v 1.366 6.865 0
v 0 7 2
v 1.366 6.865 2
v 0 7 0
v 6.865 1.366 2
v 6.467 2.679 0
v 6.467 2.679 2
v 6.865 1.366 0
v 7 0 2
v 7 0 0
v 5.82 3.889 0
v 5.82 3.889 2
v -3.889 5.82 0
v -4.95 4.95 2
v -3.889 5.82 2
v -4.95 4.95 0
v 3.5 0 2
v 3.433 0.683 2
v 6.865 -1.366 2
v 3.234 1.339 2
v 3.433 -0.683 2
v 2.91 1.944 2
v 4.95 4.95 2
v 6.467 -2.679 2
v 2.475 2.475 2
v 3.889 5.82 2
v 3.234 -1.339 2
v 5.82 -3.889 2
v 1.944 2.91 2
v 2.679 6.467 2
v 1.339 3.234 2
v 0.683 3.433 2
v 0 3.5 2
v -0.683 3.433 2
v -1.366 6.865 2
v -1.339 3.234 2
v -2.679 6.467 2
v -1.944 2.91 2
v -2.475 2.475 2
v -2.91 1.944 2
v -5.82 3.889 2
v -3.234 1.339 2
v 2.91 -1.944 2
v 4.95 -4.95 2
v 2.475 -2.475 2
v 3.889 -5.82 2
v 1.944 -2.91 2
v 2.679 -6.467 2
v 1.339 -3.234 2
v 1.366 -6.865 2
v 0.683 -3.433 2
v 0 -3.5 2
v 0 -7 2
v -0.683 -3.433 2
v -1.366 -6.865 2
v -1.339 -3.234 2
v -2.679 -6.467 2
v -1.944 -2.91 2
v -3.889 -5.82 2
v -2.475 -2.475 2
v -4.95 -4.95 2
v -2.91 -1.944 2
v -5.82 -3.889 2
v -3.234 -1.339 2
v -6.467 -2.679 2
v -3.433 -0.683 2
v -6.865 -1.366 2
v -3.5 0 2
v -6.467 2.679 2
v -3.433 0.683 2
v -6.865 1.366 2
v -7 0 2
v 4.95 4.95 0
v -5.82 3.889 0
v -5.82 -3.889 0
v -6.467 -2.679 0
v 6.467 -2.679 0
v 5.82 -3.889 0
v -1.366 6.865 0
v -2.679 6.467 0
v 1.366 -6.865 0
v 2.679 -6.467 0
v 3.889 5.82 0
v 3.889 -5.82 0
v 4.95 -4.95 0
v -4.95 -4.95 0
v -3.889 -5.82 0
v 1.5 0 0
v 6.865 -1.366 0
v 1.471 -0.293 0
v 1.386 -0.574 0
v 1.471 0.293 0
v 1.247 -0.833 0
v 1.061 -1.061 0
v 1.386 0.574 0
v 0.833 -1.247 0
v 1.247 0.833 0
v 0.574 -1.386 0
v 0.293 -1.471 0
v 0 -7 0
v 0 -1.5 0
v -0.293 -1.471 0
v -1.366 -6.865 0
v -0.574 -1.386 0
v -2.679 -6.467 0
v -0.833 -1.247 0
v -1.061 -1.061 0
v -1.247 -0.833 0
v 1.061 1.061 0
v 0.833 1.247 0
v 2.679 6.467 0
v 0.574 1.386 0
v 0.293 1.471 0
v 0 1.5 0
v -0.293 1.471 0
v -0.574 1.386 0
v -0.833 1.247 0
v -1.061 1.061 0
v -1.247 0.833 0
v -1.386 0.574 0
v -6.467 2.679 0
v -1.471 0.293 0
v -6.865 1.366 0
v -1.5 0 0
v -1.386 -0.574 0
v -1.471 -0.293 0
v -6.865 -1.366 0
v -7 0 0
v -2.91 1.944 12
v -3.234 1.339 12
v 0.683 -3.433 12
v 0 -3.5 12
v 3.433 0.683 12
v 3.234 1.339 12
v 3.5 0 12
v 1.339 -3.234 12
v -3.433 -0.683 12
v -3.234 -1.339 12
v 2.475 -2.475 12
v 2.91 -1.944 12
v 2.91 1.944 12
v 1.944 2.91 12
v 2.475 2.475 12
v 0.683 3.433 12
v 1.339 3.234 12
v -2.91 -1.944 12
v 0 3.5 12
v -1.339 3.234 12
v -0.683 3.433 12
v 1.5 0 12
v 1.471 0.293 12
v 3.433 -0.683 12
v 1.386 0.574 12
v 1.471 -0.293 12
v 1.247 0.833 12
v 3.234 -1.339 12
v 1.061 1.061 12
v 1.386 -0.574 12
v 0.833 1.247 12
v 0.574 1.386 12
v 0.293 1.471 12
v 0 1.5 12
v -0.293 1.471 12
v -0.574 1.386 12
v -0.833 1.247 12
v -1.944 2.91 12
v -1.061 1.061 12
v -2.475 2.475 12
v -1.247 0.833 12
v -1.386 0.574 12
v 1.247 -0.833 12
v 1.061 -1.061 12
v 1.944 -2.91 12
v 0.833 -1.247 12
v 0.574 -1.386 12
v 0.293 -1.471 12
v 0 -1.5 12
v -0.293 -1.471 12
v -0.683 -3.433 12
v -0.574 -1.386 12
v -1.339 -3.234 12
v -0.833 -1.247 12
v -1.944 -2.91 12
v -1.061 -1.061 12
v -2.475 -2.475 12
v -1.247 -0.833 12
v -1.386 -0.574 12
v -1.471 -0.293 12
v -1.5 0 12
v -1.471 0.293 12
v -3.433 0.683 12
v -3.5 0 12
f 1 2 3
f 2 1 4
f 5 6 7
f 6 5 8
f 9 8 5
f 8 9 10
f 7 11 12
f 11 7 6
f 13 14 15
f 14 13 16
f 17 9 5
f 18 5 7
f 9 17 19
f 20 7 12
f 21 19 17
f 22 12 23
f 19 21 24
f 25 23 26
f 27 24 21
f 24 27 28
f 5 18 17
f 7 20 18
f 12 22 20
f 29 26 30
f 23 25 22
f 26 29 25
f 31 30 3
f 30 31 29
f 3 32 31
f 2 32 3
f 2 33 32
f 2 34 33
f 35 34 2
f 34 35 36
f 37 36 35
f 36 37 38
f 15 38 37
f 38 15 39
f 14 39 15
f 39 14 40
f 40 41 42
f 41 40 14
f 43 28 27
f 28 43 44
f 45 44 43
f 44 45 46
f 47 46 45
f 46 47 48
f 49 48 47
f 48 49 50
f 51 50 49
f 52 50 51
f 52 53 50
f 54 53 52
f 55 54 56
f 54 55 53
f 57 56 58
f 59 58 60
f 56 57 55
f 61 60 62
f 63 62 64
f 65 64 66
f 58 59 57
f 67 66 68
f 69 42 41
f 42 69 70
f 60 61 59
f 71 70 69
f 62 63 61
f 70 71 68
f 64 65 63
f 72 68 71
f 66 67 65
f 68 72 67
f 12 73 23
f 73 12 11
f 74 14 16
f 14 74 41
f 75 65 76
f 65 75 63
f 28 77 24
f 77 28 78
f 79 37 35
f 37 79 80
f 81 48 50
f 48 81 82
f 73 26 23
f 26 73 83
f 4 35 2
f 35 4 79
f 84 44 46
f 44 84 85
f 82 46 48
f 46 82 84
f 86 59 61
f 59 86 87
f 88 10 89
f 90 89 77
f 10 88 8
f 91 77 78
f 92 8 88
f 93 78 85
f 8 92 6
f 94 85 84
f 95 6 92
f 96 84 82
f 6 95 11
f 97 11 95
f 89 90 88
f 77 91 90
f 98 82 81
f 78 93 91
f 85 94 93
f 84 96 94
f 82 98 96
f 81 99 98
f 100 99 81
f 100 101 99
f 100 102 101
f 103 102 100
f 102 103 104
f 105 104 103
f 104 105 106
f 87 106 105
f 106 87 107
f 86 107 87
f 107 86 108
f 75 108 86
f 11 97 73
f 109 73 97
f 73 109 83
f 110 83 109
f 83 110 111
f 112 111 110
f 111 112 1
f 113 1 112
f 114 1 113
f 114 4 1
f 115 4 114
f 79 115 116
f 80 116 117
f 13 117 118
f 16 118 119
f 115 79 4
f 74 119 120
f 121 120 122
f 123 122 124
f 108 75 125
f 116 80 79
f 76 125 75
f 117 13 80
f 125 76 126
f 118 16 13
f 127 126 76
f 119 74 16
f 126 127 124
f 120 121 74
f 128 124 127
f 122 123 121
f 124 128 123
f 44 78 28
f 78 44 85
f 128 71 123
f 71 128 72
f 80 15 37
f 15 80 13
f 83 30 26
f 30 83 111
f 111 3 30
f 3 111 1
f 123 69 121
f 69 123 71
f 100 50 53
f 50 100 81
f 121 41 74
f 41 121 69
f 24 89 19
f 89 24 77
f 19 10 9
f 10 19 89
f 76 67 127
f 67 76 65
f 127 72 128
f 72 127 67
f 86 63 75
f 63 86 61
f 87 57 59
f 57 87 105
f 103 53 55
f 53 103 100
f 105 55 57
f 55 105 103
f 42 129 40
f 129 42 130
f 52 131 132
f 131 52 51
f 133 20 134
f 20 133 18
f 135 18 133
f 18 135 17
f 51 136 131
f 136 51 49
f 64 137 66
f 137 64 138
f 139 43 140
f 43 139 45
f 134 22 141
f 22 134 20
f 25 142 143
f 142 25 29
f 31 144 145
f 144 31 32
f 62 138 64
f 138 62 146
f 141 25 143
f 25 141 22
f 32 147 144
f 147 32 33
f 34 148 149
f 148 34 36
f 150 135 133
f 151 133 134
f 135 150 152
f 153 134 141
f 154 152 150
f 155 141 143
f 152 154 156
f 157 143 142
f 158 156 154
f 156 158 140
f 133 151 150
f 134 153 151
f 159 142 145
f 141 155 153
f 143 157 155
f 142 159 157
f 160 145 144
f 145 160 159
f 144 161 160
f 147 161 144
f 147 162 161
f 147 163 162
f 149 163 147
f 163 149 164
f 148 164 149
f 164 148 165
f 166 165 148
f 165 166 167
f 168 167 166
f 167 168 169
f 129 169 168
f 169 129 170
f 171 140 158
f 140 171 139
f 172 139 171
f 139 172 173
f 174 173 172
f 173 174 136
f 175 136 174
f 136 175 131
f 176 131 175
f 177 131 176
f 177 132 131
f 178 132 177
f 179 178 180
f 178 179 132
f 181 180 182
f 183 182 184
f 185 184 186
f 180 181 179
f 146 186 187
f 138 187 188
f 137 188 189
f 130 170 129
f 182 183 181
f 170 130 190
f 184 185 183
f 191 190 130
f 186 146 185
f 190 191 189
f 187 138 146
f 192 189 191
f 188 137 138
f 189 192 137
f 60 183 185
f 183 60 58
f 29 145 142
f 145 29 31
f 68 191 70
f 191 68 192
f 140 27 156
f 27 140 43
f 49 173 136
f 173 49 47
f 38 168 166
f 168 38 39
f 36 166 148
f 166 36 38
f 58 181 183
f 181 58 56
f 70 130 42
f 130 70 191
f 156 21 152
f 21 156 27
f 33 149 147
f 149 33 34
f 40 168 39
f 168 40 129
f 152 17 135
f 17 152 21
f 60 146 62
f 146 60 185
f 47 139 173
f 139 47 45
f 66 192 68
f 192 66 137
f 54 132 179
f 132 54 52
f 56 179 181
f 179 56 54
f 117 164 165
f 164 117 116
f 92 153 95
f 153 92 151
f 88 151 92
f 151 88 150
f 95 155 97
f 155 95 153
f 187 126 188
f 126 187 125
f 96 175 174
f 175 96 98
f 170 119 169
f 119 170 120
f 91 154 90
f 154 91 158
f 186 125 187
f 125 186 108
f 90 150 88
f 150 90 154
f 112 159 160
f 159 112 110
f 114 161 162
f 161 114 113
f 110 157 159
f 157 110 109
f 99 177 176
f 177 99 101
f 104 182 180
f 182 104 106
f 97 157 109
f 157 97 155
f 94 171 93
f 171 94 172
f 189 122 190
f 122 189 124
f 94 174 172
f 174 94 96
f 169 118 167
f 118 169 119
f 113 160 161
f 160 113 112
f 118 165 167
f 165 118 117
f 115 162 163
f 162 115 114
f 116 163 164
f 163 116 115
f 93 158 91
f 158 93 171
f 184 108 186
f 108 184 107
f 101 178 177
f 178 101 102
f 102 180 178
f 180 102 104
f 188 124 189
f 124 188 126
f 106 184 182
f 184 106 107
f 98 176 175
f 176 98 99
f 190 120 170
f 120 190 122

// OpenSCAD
$fn = 32;

// ----------------------------------------------------------------------
// Micro post: flanged post, 5-20 mm class
// ----------------------------------------------------------------------

// --- parameters (mm) ---
post_d = 7;               // post diameter
post_h = 10;              // post height above the flange
flange_d = 14;            // flange diameter
flange_t = 2;             // flange thickness
bore_d = 3;               // through bore

total_h = post_h + flange_t;  // overall height

difference() {
  union() {
    cylinder(h = flange_t, d = flange_d);
    translate([0, 0, flange_t]) cylinder(h = post_h, d = post_d);
  }
  translate([0, 0, -1]) cylinder(h = total_h + 2, d = bore_d);
}
